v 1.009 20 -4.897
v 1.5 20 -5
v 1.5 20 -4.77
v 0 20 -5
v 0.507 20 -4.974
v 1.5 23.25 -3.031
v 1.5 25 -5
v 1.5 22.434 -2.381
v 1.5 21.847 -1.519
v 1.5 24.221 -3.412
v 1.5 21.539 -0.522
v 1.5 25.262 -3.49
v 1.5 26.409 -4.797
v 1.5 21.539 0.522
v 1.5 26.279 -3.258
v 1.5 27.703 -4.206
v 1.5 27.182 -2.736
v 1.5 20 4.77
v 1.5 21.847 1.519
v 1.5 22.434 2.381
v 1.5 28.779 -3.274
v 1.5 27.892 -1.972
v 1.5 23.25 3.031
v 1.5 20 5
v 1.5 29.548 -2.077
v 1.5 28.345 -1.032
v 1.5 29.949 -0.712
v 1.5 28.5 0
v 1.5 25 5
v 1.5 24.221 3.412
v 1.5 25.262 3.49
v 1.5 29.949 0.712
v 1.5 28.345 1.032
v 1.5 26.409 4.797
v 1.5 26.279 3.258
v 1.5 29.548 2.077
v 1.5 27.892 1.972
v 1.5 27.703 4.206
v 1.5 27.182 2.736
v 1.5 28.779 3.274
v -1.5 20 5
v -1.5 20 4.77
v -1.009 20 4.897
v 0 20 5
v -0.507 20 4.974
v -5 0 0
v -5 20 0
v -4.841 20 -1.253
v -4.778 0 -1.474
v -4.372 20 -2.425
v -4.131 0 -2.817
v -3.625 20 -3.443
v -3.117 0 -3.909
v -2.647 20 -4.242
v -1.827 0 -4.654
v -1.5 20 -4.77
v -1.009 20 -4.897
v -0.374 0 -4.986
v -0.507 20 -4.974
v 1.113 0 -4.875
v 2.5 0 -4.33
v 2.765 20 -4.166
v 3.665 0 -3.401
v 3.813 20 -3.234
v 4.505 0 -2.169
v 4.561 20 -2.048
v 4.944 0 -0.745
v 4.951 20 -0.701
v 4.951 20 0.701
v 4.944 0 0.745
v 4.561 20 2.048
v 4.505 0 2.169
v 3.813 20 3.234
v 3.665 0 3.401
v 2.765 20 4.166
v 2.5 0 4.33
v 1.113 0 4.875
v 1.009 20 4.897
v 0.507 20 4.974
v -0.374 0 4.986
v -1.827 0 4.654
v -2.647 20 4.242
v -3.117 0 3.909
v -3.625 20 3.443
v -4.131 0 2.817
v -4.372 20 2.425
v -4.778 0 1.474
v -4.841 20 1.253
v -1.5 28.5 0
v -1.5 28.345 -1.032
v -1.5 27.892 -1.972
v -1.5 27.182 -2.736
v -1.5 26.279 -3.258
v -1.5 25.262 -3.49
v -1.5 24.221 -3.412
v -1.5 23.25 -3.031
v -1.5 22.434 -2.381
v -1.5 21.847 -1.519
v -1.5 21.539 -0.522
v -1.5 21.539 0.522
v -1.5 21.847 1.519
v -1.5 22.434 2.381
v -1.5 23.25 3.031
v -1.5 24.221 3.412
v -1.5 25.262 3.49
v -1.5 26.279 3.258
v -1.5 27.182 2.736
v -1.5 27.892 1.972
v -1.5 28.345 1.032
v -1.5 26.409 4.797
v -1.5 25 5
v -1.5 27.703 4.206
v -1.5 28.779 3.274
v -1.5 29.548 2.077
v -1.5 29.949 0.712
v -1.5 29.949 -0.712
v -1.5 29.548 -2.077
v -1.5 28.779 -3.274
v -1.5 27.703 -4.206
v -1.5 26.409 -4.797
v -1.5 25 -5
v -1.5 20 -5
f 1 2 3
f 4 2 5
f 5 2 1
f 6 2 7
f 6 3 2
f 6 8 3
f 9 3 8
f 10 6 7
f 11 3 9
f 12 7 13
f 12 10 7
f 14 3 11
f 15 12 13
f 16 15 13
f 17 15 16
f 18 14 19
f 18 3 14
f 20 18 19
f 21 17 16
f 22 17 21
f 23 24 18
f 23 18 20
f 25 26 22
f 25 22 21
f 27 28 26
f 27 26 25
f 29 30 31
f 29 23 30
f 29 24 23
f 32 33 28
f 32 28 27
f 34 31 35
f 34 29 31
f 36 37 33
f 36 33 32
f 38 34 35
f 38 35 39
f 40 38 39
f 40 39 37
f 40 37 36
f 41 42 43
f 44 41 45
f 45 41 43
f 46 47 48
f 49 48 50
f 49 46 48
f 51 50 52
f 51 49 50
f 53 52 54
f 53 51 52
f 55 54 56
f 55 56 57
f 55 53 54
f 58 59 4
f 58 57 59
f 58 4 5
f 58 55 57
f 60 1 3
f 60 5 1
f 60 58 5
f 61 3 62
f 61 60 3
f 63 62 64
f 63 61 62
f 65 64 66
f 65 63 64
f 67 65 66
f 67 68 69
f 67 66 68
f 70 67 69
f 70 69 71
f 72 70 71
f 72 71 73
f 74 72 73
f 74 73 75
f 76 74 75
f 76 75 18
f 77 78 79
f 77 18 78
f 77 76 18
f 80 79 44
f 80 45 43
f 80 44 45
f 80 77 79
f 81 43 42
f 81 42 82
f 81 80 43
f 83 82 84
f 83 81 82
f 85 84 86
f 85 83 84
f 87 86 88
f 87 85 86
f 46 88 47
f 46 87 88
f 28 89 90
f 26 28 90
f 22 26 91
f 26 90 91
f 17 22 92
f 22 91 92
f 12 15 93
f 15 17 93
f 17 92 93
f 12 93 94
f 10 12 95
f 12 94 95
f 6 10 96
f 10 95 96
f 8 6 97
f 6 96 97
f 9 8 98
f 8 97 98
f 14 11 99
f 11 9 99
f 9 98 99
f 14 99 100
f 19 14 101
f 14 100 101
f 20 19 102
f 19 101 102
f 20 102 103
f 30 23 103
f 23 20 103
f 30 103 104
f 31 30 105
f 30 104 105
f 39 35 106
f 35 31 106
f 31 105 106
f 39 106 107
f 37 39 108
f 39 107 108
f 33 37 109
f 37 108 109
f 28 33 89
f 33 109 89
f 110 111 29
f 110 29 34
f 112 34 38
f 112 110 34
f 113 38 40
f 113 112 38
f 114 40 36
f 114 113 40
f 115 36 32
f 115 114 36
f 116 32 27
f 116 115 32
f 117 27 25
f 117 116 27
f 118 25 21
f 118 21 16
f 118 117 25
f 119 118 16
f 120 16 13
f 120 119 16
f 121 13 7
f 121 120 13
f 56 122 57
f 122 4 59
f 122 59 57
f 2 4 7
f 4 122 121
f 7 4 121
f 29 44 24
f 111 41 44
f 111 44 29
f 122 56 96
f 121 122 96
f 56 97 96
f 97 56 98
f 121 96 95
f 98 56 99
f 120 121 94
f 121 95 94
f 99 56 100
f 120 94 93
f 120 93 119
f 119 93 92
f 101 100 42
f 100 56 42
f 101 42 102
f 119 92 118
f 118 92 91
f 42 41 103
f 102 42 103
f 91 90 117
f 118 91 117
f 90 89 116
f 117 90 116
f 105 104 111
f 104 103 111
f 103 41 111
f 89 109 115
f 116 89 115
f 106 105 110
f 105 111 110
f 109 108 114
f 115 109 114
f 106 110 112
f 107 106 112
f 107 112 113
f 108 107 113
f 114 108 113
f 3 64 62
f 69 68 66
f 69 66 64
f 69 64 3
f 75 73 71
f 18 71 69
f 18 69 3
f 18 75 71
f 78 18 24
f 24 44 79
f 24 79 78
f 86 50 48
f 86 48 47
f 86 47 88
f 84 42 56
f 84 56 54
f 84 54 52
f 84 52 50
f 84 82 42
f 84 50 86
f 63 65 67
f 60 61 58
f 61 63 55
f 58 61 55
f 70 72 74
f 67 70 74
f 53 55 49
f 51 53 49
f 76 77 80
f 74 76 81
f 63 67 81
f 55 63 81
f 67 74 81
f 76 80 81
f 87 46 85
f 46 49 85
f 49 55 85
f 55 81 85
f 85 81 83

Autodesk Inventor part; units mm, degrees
ref_plane "YZ Plane" through (0, 0, 0) normal (1, 0, 0) x (0, 1, 0)
ref_plane "XZ Plane" through (0, 0, 0) normal (0, 1, 0) x (-1, 0, 0)
ref_plane "XY Plane" through (0, 0, 0) normal (0, 0, 1) x (1, 0, 0)
sketch "Sketch3" plane through (0, 0, 0) normal (0, 1, 0) x (-1, 0, 0)
  circle A0 centre (0, 0) radius 5
  dimension "d8" = 10
extrude "Extrusion3" add sketch "Sketch3" along normal blind 20
sketch "Sketch4" plane through (0, 0, 0) normal (1, 0, 0) x (0, 1, 0)
  circle A0 centre (25, 0) radius 3.5
  circle A1 centre (25, 0) radius 5
  line L0 (20, -5) -> (20, 5) projected
  line L1 (20, -5) -> (25, -5)
  line L2 (20, 5) -> (25, 5)
  point P0 (0, 0)
  point P1 (25, 5)
  point P2 (52.9865, 4.5767)
  point P3 (20, 0)
  dimension "d11" = 7
  dimension "d12" = 10
extrude "Extrusion4" add sketch "Sketch4" along normal mid plane 3
properties part number "FP V2 Z Axis connector"
